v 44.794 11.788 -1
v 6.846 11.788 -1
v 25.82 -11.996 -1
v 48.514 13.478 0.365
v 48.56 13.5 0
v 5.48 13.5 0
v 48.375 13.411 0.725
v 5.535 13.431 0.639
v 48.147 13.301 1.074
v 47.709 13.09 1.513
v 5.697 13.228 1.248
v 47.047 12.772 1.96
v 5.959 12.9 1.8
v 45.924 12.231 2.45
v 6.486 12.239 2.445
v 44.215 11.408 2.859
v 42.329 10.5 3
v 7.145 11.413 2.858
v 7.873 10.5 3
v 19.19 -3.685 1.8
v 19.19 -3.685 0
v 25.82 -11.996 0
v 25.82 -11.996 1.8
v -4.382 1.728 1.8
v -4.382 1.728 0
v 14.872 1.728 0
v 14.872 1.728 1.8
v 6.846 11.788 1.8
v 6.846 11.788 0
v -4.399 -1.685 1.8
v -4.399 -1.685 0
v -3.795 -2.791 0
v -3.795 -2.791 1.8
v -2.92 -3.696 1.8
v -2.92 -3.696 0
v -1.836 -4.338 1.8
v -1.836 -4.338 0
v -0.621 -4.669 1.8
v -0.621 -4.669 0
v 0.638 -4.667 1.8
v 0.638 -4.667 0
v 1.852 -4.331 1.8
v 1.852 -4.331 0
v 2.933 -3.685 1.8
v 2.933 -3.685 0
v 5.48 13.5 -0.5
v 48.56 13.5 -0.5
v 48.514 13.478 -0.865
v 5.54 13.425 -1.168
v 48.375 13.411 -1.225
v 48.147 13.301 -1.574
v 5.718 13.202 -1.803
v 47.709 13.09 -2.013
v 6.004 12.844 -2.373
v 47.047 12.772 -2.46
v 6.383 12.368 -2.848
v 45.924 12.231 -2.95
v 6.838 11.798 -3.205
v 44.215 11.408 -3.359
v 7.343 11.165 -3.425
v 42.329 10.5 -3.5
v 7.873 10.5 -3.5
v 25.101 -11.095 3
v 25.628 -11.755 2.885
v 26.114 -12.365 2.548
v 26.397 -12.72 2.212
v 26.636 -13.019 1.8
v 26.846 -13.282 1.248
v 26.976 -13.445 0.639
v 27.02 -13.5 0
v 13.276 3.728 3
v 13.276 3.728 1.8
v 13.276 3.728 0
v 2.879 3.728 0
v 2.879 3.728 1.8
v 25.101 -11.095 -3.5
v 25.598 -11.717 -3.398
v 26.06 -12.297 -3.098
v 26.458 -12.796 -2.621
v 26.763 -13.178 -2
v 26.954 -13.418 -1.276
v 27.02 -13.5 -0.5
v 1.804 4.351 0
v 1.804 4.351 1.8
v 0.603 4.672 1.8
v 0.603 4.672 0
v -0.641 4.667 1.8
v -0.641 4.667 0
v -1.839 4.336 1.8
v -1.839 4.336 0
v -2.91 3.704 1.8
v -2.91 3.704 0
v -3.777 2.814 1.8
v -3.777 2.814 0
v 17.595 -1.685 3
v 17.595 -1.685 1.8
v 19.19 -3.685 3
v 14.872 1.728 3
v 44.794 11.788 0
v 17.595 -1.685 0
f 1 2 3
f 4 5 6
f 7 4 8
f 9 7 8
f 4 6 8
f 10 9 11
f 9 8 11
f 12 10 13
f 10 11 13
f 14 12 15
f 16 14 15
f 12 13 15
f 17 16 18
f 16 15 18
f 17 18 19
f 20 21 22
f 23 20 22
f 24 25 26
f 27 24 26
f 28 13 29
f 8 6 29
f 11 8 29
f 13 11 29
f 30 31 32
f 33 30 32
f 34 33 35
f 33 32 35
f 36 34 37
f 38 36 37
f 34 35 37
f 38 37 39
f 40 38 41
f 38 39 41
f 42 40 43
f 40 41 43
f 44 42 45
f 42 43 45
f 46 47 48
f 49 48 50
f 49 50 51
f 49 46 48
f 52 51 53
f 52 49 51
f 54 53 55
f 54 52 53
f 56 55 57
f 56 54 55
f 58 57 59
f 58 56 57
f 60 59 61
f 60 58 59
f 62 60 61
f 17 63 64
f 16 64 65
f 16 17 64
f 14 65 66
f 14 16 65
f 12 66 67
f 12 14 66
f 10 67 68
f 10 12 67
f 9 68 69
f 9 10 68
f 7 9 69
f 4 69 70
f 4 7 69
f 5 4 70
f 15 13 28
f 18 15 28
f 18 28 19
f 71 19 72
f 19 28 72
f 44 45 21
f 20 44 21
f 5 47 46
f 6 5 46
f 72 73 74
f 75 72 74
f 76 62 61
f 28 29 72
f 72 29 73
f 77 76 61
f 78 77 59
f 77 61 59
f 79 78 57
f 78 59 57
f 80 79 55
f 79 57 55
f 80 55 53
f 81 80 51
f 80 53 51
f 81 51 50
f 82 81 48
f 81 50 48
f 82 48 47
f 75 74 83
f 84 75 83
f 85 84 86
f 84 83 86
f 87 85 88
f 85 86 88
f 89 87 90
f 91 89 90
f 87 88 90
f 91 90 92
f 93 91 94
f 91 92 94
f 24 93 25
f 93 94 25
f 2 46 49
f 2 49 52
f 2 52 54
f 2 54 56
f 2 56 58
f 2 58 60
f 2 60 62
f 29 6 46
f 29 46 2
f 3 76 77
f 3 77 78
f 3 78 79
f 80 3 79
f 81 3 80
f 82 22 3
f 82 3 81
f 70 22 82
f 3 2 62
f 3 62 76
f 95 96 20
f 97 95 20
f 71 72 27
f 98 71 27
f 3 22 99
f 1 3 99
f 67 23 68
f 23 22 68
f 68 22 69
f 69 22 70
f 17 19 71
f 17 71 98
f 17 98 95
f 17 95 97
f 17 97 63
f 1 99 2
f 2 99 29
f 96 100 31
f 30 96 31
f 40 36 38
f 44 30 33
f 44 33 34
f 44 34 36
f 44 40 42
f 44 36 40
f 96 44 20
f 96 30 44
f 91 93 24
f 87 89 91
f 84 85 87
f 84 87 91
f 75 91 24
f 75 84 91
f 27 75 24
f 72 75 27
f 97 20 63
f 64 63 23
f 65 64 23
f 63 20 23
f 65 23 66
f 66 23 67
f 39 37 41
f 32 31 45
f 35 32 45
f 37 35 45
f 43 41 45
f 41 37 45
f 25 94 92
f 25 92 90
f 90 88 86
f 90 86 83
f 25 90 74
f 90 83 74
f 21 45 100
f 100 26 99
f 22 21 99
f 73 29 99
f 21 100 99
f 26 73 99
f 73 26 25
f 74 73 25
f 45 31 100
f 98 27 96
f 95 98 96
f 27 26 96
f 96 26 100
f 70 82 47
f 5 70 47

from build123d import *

# Parameters (mm, degrees)
F2_DEPTH = 3.5
F4_DEPTH = 1
F6_DEPTH = 1.8
F8_DEPTH = 1.2
F9_R     = 3


with BuildPart() as f2:
    # F1 (on Top) → F2 (new body)
    with BuildSketch(Plane.XY):
        Polygon((48.5598316574, 13.5), (5.4801683426, 13.5), (27.0198316574, -13.5), align=None)
    extrude(amount=-F2_DEPTH)

    # F3 (on Top) → F4 (cut)
    with BuildSketch(Plane.XY):
        Polygon((44.7943471372, 11.7882982132), (6.8457046456, 11.7882982132), (25.8198775993, -11.9958558036), align=None)
    extrude(amount=-F4_DEPTH, mode=Mode.SUBTRACT)

    # F5 (on face) → F6 (join)
    with BuildSketch(Plane.XY):
        with BuildLine():
            ThreePointArc((2.8793278964, 3.7278809202), (3.7658696299, 2.8294612951), (4.3820146982, 1.7278809202))
            Line((4.3820146982, 1.7278809202), (14.8715565456, 1.7278809202))
            Line((14.8715565456, 1.7278809202), (17.594606702, -1.6854665007))
            Line((17.594606702, -1.6854665007), (4.3985029231, -1.6854665007))
            ThreePointArc((4.3985029231, -1.6854665007), (3.7999051439, -2.783585132), (2.9334215452, -3.6854665007))
            Line((2.9334215452, -3.6854665007), (19.1901373179, -3.6854665007))
            Line((19.1901373179, -3.6854665007), (25.8198775993, -11.9958558036))
            Line((25.8198775993, -11.9958558036), (44.7943471372, 11.7882982132))
            Line((44.7943471372, 11.7882982132), (6.8457046456, 11.7882982132))
            Line((6.8457046456, 11.7882982132), (13.2760259297, 3.7278809202))
            Line((13.2760259297, 3.7278809202), (2.8793278964, 3.7278809202))
        make_face()
        Polygon((5.4801683426, 13.5), (6.8457046456, 11.7882982132), (44.7943471372, 11.7882982132), (25.8198775993, -11.9958558036), (27.0198316574, -13.5), (48.5598316574, 13.5), align=None)
        with BuildLine():
            Line((-4.3820146982, 1.7278809202), (4.3820146982, 1.7278809202))
            ThreePointArc((4.3820146982, 1.7278809202), (3.7658696299, 2.8294612951), (2.8793278964, 3.7278809202))
            ThreePointArc((2.8793278964, 3.7278809202), (-1.2508065023, 4.5412672663), (-4.3820146982, 1.7278809202))
        make_face()
        with BuildLine():
            ThreePointArc((2.9334215452, -3.6854665007), (3.7999051439, -2.783585132), (4.3985029231, -1.6854665007))
            Line((4.3985029231, -1.6854665007), (-4.3985029231, -1.6854665007))
            ThreePointArc((-4.3985029231, -1.6854665007), (-1.2396031062, -4.5443381728), (2.9334215452, -3.6854665007))
        make_face()
    extrude(amount=F6_DEPTH)

    # F7 (on face) → F8 (join)
    with BuildSketch(Plane.XY.offset(1.8)):
        Polygon((48.5598316574, 13.5), (5.4801683426, 13.5), (13.2760259297, 3.7278809202), (14.8715565456, 1.7278809202), (17.594606702, -1.6854665007), (19.1901373179, -3.6854665007), (27.0198316574, -13.5), align=None)
    extrude(amount=F8_DEPTH)

    # F9
    f9_edges = [f2.edges().sort_by_distance(p)[0] for p in [
        (27.02, 13.5, 3),
        (27.02, 13.5, -3.5),
        (37.789832, 0, 3),
        (37.789832, 0, -3.5),
    ]]
    fillet(f9_edges, radius=F9_R)


solid = f2.part
